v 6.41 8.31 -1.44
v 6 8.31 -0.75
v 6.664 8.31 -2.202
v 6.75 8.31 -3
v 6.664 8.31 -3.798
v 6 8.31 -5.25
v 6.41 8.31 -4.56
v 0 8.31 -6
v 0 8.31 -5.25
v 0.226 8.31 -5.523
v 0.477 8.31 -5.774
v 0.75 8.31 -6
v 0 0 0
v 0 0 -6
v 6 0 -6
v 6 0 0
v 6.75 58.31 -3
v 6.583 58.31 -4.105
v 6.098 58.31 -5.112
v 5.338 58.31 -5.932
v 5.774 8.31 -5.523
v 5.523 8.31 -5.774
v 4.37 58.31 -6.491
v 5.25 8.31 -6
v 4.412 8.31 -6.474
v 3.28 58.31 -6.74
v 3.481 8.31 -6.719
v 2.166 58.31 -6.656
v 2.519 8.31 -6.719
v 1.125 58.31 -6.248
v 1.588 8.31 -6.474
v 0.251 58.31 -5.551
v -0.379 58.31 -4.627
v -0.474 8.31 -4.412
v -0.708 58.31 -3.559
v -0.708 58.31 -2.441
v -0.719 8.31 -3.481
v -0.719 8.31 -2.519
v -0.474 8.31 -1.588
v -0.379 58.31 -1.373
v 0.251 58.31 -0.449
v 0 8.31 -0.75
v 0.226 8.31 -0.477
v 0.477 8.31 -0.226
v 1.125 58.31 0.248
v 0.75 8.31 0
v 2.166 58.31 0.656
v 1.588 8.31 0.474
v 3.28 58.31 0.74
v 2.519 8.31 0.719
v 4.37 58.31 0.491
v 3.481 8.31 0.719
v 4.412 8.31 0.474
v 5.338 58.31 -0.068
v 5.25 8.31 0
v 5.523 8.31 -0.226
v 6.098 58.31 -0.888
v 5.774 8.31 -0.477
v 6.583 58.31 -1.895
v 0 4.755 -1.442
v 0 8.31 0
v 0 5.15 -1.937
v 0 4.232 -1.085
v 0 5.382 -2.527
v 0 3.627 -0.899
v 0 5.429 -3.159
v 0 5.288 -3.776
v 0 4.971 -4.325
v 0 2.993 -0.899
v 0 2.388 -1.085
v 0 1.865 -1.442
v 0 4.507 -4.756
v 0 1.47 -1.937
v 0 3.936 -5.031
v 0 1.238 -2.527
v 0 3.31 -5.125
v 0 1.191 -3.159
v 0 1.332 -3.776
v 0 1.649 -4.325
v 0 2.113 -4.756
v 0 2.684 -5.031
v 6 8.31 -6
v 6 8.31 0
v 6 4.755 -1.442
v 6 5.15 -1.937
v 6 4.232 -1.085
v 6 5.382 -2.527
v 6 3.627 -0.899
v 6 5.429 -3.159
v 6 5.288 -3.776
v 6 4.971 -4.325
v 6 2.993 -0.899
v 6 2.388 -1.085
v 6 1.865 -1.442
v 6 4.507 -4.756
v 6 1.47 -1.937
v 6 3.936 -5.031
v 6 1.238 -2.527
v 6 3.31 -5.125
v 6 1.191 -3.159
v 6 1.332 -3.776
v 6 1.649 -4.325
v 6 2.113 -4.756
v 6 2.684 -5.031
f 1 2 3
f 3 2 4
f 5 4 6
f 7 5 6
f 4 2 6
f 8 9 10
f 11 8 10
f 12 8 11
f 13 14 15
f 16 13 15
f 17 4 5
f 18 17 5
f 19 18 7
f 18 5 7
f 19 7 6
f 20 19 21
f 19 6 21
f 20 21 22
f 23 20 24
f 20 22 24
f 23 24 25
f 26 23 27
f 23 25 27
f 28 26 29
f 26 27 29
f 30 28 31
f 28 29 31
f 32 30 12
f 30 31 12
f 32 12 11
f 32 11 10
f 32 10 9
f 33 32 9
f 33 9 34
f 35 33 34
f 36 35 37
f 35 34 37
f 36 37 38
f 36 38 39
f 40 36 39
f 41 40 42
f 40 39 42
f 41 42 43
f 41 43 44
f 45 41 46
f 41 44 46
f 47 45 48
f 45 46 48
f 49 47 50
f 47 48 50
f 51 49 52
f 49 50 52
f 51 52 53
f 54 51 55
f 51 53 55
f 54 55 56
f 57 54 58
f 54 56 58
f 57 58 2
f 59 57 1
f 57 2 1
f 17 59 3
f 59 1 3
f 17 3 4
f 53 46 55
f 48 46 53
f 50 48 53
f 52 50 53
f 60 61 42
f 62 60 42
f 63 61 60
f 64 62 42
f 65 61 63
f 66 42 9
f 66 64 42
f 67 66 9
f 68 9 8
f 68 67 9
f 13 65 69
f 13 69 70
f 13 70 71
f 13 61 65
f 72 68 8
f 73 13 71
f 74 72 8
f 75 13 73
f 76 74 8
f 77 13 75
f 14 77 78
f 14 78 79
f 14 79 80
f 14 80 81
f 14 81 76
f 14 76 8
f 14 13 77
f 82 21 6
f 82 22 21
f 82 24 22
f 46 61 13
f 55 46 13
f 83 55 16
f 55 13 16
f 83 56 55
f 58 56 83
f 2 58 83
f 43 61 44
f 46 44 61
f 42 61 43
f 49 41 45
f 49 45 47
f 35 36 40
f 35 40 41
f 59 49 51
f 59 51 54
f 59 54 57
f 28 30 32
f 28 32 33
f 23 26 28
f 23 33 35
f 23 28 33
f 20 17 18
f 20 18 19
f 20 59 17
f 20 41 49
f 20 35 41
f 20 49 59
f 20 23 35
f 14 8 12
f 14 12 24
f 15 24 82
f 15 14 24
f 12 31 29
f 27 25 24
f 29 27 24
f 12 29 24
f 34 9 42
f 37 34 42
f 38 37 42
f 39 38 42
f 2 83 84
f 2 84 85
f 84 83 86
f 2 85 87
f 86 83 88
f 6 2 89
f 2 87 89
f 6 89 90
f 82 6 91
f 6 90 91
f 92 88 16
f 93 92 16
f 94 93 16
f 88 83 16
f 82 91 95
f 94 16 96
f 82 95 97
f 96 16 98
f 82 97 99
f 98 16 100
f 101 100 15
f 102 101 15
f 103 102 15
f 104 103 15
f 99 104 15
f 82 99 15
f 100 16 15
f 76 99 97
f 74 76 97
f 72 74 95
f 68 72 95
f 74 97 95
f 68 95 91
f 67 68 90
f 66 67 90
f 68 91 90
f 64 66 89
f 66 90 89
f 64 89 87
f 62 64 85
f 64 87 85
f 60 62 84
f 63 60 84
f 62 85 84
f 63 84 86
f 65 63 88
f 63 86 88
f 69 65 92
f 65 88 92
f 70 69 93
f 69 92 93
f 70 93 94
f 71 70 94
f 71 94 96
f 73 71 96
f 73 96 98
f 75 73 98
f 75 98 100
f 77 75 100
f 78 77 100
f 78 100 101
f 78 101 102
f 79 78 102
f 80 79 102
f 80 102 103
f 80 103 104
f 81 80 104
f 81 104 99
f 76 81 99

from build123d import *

# Parameters (mm, degrees)
SKETCH1_W           = 6
SKETCH1_H           = 6
BOSS_EXTRUDE1_DEPTH = 8.31
SKETCH2_R           = 2.125
CUT_EXTRUDE1_DEPTH  = 10
SKETCH3_R           = 3.75
BOSS_EXTRUDE2_DEPTH = 50


with BuildPart() as part:
    # Sketch1 → Boss-Extrude1 (new body)
    with BuildSketch(Plane(origin=(0, 0, 0), x_dir=(1, 0, 0), z_dir=(0, 1, 0))):
        with Locations((3, 3)):
            Rectangle(SKETCH1_W, SKETCH1_H)
    extrude(amount=BOSS_EXTRUDE1_DEPTH)

    # Sketch2 → Cut-Extrude1 (cut)
    with BuildSketch(Plane(origin=(6, 0, 0), x_dir=(0, 0, -1), z_dir=(1, 0, 0))):
        with Locations((3, 3.31)):
            Circle(SKETCH2_R)
    extrude(amount=-CUT_EXTRUDE1_DEPTH, mode=Mode.SUBTRACT)

    # Sketch3 → Boss-Extrude2 (add)
    with BuildSketch(Plane(origin=(0, 8.31, 0), x_dir=(1, 0, 0), z_dir=(0, 1, 0))):
        with Locations((3, 3)):
            Circle(SKETCH3_R)
    extrude(amount=BOSS_EXTRUDE2_DEPTH)


solid = part.part
